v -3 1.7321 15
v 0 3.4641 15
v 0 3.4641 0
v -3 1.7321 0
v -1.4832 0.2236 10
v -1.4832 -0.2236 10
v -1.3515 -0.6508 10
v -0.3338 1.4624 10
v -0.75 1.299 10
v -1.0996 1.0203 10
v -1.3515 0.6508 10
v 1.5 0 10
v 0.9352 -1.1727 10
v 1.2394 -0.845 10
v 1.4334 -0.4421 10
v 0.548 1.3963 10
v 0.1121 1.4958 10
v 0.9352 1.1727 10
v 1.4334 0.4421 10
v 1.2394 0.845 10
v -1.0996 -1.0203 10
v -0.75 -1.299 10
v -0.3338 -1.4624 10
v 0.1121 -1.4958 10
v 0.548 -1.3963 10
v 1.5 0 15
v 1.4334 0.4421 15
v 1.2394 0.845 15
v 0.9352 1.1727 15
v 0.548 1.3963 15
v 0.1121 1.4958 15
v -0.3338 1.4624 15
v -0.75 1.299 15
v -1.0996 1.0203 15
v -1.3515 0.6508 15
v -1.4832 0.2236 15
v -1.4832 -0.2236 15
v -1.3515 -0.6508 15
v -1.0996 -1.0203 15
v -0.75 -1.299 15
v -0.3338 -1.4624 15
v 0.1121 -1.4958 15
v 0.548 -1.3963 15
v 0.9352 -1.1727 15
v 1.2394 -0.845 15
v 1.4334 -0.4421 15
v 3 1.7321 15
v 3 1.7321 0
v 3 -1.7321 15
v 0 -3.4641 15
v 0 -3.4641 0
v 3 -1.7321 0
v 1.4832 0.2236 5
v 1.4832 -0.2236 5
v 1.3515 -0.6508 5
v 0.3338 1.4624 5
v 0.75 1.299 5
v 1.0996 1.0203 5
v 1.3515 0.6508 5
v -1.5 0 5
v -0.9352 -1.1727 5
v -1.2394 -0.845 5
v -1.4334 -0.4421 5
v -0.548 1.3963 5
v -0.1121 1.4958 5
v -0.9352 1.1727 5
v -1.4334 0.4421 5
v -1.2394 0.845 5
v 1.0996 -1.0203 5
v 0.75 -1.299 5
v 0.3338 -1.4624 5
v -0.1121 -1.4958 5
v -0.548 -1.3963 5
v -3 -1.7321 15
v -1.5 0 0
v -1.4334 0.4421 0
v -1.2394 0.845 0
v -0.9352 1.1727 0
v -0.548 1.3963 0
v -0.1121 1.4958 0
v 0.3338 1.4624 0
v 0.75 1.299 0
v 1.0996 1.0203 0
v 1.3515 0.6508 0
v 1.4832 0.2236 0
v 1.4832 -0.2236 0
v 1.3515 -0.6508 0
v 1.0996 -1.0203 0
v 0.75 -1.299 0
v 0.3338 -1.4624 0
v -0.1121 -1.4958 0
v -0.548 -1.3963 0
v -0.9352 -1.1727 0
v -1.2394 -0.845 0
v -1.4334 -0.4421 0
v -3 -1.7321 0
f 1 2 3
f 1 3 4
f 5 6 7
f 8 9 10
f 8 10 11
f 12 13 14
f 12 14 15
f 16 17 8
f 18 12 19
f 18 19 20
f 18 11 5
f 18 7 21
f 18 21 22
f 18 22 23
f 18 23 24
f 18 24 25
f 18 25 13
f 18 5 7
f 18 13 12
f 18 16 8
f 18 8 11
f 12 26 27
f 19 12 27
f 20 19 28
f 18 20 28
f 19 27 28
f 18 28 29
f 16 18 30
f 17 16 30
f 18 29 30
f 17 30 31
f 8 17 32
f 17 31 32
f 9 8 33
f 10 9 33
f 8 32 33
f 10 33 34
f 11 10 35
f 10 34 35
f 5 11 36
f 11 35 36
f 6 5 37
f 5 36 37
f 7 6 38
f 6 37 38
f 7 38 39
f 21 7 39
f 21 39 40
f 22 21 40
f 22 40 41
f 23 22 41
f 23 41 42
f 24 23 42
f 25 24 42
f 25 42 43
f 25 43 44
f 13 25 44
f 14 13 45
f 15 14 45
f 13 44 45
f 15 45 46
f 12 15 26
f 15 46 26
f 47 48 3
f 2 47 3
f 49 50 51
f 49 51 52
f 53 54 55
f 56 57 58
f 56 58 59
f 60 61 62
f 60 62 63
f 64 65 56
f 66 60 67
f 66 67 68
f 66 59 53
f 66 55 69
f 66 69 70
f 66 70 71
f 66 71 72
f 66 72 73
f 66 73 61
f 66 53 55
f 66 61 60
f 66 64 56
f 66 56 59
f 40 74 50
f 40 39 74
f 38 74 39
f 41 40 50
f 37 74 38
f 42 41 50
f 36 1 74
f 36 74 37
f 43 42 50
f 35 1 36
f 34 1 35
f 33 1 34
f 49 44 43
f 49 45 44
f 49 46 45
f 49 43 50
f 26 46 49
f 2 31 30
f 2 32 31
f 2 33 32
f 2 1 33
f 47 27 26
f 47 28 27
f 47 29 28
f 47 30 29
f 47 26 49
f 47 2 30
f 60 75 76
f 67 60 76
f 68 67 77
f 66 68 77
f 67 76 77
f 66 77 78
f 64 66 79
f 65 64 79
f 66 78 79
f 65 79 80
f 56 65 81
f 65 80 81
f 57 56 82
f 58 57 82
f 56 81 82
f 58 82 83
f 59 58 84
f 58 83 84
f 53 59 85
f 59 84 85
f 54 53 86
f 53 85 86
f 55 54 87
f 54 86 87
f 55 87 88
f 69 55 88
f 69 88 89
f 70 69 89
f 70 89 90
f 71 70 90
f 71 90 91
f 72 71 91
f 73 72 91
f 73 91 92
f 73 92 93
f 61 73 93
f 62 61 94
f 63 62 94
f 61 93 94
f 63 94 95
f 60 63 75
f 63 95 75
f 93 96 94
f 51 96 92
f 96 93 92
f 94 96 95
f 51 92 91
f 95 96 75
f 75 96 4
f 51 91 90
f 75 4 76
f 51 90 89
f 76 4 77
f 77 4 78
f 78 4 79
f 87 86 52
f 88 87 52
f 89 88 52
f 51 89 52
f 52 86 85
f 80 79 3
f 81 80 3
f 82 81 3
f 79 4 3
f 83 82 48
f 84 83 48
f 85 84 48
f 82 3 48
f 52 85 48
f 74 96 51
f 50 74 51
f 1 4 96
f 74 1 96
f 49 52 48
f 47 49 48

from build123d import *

# Parameters (mm, degrees)
BOSS_EXTRU_1_DEPTH      = 15
ESQUISSE2_R             = 1.5
ENL_V_MAT_EXTRU_1_DEPTH = 5
ESQUISSE3_R             = 1.5
ENL_V_MAT_EXTRU_2_DEPTH = 5


with BuildPart() as part:
    # Esquisse1 → Boss.-Extru.1 (new body)
    with BuildSketch(Plane.XY):
        Polygon((0, -3.464101615), (3, -1.732050808), (3, 1.732050808), (0, 3.464101615), (-3, 1.732050808), (-3, -1.732050808), align=None)
    extrude(amount=BOSS_EXTRU_1_DEPTH)

    # Esquisse2 → Enlèv. mat.-Extru.1 (cut)
    with BuildSketch(Plane(origin=(0, 0, 0), x_dir=(-1, 0, 0), z_dir=(0, 0, -1))):
        Circle(ESQUISSE2_R)
    extrude(amount=-ENL_V_MAT_EXTRU_1_DEPTH, mode=Mode.SUBTRACT)

    # Esquisse3 → Enlèv. mat.-Extru.2 (cut)
    with BuildSketch(Plane.XY.offset(15)):
        Circle(ESQUISSE3_R)
    extrude(amount=-ENL_V_MAT_EXTRU_2_DEPTH, mode=Mode.SUBTRACT)


solid = part.part
